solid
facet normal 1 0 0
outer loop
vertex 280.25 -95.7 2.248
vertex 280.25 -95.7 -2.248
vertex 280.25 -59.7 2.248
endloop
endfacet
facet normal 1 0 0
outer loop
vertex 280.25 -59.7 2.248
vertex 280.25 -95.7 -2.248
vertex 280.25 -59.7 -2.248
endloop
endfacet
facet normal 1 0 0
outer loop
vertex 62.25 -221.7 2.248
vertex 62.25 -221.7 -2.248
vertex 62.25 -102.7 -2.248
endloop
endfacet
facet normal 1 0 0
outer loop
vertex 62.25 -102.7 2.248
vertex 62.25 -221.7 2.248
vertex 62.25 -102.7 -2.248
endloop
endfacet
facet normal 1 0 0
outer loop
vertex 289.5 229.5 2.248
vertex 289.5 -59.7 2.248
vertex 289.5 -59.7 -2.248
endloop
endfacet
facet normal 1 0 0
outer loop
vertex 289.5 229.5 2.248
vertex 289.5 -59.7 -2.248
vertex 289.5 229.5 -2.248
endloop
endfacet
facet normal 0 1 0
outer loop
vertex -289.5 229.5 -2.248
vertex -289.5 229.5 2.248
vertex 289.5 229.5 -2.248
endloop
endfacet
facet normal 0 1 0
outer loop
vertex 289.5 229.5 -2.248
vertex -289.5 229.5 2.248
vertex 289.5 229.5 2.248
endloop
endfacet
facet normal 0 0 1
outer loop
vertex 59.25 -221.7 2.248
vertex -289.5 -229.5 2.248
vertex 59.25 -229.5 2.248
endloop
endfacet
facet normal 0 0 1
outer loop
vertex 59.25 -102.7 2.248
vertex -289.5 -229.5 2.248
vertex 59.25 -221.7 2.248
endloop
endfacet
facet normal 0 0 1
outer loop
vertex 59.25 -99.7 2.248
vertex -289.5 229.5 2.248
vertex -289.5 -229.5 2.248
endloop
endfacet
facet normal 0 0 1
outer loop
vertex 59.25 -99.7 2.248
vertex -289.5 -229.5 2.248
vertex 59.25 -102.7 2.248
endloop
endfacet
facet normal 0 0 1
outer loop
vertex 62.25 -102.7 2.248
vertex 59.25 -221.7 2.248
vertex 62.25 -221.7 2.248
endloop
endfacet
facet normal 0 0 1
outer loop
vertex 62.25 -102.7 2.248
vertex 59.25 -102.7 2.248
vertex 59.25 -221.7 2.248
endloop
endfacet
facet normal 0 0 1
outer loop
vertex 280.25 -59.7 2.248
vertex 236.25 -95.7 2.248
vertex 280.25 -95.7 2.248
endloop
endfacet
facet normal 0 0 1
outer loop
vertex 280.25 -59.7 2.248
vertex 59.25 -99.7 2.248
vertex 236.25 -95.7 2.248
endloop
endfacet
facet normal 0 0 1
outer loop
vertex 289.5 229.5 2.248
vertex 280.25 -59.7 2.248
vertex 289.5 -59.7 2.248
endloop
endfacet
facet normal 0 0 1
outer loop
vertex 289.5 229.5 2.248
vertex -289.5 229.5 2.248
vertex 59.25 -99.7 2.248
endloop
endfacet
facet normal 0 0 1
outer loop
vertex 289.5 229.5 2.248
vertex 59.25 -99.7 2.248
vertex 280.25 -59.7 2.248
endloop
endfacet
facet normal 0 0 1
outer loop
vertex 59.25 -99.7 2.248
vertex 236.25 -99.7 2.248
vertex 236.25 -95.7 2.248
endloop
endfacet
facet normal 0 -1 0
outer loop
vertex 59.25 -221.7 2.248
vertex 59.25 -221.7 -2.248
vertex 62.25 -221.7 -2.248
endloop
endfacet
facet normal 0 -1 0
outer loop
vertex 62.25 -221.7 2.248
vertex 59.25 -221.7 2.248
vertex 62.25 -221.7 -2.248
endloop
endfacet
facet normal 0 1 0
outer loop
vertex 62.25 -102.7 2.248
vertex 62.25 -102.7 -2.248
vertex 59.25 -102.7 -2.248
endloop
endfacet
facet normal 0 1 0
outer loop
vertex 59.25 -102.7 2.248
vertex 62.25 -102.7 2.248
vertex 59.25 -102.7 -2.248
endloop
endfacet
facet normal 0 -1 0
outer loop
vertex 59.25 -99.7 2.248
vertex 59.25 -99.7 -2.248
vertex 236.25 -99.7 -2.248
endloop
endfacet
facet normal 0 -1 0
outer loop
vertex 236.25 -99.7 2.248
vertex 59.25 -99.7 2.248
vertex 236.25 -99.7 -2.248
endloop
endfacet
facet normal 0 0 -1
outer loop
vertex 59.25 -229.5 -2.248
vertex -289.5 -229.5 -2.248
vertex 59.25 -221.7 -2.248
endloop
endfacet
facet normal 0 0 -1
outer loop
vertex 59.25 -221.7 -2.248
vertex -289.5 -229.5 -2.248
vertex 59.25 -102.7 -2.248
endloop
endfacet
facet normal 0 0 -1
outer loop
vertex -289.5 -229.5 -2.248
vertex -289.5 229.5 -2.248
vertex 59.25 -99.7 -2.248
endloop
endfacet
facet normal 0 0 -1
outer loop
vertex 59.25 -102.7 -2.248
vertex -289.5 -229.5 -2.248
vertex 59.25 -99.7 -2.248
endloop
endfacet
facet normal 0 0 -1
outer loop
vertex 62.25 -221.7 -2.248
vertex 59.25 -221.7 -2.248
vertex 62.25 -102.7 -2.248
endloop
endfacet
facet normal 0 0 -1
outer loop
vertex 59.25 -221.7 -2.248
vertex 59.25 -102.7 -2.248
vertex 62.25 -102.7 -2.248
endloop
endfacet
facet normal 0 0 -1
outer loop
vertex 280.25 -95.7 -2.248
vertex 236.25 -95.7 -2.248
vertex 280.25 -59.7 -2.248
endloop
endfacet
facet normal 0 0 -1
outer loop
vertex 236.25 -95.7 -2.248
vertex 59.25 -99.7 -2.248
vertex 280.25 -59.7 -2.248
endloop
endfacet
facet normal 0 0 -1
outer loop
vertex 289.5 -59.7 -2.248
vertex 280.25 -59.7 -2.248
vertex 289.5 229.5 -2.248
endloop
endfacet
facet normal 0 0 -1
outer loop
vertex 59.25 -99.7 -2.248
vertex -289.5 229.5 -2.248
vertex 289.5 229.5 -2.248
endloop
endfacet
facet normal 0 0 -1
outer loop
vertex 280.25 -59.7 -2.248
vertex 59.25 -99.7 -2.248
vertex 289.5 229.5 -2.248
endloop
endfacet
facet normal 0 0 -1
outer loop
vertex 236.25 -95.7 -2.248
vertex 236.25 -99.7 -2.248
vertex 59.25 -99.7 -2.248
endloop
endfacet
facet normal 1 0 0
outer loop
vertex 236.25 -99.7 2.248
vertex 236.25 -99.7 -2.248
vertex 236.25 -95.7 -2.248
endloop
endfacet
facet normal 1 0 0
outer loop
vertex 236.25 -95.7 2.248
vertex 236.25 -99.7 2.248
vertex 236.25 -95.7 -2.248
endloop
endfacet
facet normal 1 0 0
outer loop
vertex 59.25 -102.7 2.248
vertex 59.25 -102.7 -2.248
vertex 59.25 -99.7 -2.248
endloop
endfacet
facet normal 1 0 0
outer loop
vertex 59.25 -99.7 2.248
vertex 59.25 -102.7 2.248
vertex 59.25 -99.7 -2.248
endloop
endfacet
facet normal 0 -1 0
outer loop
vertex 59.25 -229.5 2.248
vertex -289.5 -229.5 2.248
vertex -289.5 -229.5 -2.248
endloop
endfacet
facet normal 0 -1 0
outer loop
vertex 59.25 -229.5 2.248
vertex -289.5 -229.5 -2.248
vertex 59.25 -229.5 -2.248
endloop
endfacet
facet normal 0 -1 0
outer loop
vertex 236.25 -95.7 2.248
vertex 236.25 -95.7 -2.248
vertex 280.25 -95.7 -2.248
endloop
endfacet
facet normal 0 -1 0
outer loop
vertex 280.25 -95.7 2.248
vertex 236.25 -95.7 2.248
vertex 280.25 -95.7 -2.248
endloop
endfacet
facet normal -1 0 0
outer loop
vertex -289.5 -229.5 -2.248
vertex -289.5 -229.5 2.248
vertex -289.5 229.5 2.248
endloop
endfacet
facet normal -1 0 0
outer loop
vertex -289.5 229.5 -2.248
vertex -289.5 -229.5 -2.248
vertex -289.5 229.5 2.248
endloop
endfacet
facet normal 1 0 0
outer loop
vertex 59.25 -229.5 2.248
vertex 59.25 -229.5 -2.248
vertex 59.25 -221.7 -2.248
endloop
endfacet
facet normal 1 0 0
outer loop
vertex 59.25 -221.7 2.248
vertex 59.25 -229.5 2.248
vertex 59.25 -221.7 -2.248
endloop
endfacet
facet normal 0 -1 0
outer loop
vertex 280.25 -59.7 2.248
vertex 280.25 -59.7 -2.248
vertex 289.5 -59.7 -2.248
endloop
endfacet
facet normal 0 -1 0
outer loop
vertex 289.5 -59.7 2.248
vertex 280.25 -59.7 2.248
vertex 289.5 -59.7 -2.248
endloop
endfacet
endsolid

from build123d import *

# Parameters (mm, degrees)
SKETCH1_W           = 579
SKETCH1_H           = 459
BOSS_EXTRUDE1_DEPTH = 2.2479
CUT_EXTRUDE1_DEPTH  = 4.4958


with BuildPart() as part:
    # Sketch1 → Boss-Extrude1 (new body, symmetric)
    with BuildSketch(Plane.XY):
        Rectangle(SKETCH1_W, SKETCH1_H)
    extrude(amount=BOSS_EXTRUDE1_DEPTH, both=True)

    # Sketch2 → Cut-Extrude1 (cut)
    with BuildSketch(Plane(origin=(0, 0, -2.2479), x_dir=(-1, 0, 0), z_dir=(0, 0, -1))):
        Polygon((-280.249993563, -59.7), (-290, -59.7), (-290, -230), (-59.249993563, -230), (-59.249993563, -221.7), (-62.249993563, -221.7), (-62.249993563, -102.7), (-59.249993563, -102.7), (-59.249993563, -99.7), (-236.249993563, -99.7), (-236.249993563, -95.7), (-280.249993563, -95.7), align=None)
    extrude(amount=-CUT_EXTRUDE1_DEPTH, mode=Mode.SUBTRACT)


solid = part.part
